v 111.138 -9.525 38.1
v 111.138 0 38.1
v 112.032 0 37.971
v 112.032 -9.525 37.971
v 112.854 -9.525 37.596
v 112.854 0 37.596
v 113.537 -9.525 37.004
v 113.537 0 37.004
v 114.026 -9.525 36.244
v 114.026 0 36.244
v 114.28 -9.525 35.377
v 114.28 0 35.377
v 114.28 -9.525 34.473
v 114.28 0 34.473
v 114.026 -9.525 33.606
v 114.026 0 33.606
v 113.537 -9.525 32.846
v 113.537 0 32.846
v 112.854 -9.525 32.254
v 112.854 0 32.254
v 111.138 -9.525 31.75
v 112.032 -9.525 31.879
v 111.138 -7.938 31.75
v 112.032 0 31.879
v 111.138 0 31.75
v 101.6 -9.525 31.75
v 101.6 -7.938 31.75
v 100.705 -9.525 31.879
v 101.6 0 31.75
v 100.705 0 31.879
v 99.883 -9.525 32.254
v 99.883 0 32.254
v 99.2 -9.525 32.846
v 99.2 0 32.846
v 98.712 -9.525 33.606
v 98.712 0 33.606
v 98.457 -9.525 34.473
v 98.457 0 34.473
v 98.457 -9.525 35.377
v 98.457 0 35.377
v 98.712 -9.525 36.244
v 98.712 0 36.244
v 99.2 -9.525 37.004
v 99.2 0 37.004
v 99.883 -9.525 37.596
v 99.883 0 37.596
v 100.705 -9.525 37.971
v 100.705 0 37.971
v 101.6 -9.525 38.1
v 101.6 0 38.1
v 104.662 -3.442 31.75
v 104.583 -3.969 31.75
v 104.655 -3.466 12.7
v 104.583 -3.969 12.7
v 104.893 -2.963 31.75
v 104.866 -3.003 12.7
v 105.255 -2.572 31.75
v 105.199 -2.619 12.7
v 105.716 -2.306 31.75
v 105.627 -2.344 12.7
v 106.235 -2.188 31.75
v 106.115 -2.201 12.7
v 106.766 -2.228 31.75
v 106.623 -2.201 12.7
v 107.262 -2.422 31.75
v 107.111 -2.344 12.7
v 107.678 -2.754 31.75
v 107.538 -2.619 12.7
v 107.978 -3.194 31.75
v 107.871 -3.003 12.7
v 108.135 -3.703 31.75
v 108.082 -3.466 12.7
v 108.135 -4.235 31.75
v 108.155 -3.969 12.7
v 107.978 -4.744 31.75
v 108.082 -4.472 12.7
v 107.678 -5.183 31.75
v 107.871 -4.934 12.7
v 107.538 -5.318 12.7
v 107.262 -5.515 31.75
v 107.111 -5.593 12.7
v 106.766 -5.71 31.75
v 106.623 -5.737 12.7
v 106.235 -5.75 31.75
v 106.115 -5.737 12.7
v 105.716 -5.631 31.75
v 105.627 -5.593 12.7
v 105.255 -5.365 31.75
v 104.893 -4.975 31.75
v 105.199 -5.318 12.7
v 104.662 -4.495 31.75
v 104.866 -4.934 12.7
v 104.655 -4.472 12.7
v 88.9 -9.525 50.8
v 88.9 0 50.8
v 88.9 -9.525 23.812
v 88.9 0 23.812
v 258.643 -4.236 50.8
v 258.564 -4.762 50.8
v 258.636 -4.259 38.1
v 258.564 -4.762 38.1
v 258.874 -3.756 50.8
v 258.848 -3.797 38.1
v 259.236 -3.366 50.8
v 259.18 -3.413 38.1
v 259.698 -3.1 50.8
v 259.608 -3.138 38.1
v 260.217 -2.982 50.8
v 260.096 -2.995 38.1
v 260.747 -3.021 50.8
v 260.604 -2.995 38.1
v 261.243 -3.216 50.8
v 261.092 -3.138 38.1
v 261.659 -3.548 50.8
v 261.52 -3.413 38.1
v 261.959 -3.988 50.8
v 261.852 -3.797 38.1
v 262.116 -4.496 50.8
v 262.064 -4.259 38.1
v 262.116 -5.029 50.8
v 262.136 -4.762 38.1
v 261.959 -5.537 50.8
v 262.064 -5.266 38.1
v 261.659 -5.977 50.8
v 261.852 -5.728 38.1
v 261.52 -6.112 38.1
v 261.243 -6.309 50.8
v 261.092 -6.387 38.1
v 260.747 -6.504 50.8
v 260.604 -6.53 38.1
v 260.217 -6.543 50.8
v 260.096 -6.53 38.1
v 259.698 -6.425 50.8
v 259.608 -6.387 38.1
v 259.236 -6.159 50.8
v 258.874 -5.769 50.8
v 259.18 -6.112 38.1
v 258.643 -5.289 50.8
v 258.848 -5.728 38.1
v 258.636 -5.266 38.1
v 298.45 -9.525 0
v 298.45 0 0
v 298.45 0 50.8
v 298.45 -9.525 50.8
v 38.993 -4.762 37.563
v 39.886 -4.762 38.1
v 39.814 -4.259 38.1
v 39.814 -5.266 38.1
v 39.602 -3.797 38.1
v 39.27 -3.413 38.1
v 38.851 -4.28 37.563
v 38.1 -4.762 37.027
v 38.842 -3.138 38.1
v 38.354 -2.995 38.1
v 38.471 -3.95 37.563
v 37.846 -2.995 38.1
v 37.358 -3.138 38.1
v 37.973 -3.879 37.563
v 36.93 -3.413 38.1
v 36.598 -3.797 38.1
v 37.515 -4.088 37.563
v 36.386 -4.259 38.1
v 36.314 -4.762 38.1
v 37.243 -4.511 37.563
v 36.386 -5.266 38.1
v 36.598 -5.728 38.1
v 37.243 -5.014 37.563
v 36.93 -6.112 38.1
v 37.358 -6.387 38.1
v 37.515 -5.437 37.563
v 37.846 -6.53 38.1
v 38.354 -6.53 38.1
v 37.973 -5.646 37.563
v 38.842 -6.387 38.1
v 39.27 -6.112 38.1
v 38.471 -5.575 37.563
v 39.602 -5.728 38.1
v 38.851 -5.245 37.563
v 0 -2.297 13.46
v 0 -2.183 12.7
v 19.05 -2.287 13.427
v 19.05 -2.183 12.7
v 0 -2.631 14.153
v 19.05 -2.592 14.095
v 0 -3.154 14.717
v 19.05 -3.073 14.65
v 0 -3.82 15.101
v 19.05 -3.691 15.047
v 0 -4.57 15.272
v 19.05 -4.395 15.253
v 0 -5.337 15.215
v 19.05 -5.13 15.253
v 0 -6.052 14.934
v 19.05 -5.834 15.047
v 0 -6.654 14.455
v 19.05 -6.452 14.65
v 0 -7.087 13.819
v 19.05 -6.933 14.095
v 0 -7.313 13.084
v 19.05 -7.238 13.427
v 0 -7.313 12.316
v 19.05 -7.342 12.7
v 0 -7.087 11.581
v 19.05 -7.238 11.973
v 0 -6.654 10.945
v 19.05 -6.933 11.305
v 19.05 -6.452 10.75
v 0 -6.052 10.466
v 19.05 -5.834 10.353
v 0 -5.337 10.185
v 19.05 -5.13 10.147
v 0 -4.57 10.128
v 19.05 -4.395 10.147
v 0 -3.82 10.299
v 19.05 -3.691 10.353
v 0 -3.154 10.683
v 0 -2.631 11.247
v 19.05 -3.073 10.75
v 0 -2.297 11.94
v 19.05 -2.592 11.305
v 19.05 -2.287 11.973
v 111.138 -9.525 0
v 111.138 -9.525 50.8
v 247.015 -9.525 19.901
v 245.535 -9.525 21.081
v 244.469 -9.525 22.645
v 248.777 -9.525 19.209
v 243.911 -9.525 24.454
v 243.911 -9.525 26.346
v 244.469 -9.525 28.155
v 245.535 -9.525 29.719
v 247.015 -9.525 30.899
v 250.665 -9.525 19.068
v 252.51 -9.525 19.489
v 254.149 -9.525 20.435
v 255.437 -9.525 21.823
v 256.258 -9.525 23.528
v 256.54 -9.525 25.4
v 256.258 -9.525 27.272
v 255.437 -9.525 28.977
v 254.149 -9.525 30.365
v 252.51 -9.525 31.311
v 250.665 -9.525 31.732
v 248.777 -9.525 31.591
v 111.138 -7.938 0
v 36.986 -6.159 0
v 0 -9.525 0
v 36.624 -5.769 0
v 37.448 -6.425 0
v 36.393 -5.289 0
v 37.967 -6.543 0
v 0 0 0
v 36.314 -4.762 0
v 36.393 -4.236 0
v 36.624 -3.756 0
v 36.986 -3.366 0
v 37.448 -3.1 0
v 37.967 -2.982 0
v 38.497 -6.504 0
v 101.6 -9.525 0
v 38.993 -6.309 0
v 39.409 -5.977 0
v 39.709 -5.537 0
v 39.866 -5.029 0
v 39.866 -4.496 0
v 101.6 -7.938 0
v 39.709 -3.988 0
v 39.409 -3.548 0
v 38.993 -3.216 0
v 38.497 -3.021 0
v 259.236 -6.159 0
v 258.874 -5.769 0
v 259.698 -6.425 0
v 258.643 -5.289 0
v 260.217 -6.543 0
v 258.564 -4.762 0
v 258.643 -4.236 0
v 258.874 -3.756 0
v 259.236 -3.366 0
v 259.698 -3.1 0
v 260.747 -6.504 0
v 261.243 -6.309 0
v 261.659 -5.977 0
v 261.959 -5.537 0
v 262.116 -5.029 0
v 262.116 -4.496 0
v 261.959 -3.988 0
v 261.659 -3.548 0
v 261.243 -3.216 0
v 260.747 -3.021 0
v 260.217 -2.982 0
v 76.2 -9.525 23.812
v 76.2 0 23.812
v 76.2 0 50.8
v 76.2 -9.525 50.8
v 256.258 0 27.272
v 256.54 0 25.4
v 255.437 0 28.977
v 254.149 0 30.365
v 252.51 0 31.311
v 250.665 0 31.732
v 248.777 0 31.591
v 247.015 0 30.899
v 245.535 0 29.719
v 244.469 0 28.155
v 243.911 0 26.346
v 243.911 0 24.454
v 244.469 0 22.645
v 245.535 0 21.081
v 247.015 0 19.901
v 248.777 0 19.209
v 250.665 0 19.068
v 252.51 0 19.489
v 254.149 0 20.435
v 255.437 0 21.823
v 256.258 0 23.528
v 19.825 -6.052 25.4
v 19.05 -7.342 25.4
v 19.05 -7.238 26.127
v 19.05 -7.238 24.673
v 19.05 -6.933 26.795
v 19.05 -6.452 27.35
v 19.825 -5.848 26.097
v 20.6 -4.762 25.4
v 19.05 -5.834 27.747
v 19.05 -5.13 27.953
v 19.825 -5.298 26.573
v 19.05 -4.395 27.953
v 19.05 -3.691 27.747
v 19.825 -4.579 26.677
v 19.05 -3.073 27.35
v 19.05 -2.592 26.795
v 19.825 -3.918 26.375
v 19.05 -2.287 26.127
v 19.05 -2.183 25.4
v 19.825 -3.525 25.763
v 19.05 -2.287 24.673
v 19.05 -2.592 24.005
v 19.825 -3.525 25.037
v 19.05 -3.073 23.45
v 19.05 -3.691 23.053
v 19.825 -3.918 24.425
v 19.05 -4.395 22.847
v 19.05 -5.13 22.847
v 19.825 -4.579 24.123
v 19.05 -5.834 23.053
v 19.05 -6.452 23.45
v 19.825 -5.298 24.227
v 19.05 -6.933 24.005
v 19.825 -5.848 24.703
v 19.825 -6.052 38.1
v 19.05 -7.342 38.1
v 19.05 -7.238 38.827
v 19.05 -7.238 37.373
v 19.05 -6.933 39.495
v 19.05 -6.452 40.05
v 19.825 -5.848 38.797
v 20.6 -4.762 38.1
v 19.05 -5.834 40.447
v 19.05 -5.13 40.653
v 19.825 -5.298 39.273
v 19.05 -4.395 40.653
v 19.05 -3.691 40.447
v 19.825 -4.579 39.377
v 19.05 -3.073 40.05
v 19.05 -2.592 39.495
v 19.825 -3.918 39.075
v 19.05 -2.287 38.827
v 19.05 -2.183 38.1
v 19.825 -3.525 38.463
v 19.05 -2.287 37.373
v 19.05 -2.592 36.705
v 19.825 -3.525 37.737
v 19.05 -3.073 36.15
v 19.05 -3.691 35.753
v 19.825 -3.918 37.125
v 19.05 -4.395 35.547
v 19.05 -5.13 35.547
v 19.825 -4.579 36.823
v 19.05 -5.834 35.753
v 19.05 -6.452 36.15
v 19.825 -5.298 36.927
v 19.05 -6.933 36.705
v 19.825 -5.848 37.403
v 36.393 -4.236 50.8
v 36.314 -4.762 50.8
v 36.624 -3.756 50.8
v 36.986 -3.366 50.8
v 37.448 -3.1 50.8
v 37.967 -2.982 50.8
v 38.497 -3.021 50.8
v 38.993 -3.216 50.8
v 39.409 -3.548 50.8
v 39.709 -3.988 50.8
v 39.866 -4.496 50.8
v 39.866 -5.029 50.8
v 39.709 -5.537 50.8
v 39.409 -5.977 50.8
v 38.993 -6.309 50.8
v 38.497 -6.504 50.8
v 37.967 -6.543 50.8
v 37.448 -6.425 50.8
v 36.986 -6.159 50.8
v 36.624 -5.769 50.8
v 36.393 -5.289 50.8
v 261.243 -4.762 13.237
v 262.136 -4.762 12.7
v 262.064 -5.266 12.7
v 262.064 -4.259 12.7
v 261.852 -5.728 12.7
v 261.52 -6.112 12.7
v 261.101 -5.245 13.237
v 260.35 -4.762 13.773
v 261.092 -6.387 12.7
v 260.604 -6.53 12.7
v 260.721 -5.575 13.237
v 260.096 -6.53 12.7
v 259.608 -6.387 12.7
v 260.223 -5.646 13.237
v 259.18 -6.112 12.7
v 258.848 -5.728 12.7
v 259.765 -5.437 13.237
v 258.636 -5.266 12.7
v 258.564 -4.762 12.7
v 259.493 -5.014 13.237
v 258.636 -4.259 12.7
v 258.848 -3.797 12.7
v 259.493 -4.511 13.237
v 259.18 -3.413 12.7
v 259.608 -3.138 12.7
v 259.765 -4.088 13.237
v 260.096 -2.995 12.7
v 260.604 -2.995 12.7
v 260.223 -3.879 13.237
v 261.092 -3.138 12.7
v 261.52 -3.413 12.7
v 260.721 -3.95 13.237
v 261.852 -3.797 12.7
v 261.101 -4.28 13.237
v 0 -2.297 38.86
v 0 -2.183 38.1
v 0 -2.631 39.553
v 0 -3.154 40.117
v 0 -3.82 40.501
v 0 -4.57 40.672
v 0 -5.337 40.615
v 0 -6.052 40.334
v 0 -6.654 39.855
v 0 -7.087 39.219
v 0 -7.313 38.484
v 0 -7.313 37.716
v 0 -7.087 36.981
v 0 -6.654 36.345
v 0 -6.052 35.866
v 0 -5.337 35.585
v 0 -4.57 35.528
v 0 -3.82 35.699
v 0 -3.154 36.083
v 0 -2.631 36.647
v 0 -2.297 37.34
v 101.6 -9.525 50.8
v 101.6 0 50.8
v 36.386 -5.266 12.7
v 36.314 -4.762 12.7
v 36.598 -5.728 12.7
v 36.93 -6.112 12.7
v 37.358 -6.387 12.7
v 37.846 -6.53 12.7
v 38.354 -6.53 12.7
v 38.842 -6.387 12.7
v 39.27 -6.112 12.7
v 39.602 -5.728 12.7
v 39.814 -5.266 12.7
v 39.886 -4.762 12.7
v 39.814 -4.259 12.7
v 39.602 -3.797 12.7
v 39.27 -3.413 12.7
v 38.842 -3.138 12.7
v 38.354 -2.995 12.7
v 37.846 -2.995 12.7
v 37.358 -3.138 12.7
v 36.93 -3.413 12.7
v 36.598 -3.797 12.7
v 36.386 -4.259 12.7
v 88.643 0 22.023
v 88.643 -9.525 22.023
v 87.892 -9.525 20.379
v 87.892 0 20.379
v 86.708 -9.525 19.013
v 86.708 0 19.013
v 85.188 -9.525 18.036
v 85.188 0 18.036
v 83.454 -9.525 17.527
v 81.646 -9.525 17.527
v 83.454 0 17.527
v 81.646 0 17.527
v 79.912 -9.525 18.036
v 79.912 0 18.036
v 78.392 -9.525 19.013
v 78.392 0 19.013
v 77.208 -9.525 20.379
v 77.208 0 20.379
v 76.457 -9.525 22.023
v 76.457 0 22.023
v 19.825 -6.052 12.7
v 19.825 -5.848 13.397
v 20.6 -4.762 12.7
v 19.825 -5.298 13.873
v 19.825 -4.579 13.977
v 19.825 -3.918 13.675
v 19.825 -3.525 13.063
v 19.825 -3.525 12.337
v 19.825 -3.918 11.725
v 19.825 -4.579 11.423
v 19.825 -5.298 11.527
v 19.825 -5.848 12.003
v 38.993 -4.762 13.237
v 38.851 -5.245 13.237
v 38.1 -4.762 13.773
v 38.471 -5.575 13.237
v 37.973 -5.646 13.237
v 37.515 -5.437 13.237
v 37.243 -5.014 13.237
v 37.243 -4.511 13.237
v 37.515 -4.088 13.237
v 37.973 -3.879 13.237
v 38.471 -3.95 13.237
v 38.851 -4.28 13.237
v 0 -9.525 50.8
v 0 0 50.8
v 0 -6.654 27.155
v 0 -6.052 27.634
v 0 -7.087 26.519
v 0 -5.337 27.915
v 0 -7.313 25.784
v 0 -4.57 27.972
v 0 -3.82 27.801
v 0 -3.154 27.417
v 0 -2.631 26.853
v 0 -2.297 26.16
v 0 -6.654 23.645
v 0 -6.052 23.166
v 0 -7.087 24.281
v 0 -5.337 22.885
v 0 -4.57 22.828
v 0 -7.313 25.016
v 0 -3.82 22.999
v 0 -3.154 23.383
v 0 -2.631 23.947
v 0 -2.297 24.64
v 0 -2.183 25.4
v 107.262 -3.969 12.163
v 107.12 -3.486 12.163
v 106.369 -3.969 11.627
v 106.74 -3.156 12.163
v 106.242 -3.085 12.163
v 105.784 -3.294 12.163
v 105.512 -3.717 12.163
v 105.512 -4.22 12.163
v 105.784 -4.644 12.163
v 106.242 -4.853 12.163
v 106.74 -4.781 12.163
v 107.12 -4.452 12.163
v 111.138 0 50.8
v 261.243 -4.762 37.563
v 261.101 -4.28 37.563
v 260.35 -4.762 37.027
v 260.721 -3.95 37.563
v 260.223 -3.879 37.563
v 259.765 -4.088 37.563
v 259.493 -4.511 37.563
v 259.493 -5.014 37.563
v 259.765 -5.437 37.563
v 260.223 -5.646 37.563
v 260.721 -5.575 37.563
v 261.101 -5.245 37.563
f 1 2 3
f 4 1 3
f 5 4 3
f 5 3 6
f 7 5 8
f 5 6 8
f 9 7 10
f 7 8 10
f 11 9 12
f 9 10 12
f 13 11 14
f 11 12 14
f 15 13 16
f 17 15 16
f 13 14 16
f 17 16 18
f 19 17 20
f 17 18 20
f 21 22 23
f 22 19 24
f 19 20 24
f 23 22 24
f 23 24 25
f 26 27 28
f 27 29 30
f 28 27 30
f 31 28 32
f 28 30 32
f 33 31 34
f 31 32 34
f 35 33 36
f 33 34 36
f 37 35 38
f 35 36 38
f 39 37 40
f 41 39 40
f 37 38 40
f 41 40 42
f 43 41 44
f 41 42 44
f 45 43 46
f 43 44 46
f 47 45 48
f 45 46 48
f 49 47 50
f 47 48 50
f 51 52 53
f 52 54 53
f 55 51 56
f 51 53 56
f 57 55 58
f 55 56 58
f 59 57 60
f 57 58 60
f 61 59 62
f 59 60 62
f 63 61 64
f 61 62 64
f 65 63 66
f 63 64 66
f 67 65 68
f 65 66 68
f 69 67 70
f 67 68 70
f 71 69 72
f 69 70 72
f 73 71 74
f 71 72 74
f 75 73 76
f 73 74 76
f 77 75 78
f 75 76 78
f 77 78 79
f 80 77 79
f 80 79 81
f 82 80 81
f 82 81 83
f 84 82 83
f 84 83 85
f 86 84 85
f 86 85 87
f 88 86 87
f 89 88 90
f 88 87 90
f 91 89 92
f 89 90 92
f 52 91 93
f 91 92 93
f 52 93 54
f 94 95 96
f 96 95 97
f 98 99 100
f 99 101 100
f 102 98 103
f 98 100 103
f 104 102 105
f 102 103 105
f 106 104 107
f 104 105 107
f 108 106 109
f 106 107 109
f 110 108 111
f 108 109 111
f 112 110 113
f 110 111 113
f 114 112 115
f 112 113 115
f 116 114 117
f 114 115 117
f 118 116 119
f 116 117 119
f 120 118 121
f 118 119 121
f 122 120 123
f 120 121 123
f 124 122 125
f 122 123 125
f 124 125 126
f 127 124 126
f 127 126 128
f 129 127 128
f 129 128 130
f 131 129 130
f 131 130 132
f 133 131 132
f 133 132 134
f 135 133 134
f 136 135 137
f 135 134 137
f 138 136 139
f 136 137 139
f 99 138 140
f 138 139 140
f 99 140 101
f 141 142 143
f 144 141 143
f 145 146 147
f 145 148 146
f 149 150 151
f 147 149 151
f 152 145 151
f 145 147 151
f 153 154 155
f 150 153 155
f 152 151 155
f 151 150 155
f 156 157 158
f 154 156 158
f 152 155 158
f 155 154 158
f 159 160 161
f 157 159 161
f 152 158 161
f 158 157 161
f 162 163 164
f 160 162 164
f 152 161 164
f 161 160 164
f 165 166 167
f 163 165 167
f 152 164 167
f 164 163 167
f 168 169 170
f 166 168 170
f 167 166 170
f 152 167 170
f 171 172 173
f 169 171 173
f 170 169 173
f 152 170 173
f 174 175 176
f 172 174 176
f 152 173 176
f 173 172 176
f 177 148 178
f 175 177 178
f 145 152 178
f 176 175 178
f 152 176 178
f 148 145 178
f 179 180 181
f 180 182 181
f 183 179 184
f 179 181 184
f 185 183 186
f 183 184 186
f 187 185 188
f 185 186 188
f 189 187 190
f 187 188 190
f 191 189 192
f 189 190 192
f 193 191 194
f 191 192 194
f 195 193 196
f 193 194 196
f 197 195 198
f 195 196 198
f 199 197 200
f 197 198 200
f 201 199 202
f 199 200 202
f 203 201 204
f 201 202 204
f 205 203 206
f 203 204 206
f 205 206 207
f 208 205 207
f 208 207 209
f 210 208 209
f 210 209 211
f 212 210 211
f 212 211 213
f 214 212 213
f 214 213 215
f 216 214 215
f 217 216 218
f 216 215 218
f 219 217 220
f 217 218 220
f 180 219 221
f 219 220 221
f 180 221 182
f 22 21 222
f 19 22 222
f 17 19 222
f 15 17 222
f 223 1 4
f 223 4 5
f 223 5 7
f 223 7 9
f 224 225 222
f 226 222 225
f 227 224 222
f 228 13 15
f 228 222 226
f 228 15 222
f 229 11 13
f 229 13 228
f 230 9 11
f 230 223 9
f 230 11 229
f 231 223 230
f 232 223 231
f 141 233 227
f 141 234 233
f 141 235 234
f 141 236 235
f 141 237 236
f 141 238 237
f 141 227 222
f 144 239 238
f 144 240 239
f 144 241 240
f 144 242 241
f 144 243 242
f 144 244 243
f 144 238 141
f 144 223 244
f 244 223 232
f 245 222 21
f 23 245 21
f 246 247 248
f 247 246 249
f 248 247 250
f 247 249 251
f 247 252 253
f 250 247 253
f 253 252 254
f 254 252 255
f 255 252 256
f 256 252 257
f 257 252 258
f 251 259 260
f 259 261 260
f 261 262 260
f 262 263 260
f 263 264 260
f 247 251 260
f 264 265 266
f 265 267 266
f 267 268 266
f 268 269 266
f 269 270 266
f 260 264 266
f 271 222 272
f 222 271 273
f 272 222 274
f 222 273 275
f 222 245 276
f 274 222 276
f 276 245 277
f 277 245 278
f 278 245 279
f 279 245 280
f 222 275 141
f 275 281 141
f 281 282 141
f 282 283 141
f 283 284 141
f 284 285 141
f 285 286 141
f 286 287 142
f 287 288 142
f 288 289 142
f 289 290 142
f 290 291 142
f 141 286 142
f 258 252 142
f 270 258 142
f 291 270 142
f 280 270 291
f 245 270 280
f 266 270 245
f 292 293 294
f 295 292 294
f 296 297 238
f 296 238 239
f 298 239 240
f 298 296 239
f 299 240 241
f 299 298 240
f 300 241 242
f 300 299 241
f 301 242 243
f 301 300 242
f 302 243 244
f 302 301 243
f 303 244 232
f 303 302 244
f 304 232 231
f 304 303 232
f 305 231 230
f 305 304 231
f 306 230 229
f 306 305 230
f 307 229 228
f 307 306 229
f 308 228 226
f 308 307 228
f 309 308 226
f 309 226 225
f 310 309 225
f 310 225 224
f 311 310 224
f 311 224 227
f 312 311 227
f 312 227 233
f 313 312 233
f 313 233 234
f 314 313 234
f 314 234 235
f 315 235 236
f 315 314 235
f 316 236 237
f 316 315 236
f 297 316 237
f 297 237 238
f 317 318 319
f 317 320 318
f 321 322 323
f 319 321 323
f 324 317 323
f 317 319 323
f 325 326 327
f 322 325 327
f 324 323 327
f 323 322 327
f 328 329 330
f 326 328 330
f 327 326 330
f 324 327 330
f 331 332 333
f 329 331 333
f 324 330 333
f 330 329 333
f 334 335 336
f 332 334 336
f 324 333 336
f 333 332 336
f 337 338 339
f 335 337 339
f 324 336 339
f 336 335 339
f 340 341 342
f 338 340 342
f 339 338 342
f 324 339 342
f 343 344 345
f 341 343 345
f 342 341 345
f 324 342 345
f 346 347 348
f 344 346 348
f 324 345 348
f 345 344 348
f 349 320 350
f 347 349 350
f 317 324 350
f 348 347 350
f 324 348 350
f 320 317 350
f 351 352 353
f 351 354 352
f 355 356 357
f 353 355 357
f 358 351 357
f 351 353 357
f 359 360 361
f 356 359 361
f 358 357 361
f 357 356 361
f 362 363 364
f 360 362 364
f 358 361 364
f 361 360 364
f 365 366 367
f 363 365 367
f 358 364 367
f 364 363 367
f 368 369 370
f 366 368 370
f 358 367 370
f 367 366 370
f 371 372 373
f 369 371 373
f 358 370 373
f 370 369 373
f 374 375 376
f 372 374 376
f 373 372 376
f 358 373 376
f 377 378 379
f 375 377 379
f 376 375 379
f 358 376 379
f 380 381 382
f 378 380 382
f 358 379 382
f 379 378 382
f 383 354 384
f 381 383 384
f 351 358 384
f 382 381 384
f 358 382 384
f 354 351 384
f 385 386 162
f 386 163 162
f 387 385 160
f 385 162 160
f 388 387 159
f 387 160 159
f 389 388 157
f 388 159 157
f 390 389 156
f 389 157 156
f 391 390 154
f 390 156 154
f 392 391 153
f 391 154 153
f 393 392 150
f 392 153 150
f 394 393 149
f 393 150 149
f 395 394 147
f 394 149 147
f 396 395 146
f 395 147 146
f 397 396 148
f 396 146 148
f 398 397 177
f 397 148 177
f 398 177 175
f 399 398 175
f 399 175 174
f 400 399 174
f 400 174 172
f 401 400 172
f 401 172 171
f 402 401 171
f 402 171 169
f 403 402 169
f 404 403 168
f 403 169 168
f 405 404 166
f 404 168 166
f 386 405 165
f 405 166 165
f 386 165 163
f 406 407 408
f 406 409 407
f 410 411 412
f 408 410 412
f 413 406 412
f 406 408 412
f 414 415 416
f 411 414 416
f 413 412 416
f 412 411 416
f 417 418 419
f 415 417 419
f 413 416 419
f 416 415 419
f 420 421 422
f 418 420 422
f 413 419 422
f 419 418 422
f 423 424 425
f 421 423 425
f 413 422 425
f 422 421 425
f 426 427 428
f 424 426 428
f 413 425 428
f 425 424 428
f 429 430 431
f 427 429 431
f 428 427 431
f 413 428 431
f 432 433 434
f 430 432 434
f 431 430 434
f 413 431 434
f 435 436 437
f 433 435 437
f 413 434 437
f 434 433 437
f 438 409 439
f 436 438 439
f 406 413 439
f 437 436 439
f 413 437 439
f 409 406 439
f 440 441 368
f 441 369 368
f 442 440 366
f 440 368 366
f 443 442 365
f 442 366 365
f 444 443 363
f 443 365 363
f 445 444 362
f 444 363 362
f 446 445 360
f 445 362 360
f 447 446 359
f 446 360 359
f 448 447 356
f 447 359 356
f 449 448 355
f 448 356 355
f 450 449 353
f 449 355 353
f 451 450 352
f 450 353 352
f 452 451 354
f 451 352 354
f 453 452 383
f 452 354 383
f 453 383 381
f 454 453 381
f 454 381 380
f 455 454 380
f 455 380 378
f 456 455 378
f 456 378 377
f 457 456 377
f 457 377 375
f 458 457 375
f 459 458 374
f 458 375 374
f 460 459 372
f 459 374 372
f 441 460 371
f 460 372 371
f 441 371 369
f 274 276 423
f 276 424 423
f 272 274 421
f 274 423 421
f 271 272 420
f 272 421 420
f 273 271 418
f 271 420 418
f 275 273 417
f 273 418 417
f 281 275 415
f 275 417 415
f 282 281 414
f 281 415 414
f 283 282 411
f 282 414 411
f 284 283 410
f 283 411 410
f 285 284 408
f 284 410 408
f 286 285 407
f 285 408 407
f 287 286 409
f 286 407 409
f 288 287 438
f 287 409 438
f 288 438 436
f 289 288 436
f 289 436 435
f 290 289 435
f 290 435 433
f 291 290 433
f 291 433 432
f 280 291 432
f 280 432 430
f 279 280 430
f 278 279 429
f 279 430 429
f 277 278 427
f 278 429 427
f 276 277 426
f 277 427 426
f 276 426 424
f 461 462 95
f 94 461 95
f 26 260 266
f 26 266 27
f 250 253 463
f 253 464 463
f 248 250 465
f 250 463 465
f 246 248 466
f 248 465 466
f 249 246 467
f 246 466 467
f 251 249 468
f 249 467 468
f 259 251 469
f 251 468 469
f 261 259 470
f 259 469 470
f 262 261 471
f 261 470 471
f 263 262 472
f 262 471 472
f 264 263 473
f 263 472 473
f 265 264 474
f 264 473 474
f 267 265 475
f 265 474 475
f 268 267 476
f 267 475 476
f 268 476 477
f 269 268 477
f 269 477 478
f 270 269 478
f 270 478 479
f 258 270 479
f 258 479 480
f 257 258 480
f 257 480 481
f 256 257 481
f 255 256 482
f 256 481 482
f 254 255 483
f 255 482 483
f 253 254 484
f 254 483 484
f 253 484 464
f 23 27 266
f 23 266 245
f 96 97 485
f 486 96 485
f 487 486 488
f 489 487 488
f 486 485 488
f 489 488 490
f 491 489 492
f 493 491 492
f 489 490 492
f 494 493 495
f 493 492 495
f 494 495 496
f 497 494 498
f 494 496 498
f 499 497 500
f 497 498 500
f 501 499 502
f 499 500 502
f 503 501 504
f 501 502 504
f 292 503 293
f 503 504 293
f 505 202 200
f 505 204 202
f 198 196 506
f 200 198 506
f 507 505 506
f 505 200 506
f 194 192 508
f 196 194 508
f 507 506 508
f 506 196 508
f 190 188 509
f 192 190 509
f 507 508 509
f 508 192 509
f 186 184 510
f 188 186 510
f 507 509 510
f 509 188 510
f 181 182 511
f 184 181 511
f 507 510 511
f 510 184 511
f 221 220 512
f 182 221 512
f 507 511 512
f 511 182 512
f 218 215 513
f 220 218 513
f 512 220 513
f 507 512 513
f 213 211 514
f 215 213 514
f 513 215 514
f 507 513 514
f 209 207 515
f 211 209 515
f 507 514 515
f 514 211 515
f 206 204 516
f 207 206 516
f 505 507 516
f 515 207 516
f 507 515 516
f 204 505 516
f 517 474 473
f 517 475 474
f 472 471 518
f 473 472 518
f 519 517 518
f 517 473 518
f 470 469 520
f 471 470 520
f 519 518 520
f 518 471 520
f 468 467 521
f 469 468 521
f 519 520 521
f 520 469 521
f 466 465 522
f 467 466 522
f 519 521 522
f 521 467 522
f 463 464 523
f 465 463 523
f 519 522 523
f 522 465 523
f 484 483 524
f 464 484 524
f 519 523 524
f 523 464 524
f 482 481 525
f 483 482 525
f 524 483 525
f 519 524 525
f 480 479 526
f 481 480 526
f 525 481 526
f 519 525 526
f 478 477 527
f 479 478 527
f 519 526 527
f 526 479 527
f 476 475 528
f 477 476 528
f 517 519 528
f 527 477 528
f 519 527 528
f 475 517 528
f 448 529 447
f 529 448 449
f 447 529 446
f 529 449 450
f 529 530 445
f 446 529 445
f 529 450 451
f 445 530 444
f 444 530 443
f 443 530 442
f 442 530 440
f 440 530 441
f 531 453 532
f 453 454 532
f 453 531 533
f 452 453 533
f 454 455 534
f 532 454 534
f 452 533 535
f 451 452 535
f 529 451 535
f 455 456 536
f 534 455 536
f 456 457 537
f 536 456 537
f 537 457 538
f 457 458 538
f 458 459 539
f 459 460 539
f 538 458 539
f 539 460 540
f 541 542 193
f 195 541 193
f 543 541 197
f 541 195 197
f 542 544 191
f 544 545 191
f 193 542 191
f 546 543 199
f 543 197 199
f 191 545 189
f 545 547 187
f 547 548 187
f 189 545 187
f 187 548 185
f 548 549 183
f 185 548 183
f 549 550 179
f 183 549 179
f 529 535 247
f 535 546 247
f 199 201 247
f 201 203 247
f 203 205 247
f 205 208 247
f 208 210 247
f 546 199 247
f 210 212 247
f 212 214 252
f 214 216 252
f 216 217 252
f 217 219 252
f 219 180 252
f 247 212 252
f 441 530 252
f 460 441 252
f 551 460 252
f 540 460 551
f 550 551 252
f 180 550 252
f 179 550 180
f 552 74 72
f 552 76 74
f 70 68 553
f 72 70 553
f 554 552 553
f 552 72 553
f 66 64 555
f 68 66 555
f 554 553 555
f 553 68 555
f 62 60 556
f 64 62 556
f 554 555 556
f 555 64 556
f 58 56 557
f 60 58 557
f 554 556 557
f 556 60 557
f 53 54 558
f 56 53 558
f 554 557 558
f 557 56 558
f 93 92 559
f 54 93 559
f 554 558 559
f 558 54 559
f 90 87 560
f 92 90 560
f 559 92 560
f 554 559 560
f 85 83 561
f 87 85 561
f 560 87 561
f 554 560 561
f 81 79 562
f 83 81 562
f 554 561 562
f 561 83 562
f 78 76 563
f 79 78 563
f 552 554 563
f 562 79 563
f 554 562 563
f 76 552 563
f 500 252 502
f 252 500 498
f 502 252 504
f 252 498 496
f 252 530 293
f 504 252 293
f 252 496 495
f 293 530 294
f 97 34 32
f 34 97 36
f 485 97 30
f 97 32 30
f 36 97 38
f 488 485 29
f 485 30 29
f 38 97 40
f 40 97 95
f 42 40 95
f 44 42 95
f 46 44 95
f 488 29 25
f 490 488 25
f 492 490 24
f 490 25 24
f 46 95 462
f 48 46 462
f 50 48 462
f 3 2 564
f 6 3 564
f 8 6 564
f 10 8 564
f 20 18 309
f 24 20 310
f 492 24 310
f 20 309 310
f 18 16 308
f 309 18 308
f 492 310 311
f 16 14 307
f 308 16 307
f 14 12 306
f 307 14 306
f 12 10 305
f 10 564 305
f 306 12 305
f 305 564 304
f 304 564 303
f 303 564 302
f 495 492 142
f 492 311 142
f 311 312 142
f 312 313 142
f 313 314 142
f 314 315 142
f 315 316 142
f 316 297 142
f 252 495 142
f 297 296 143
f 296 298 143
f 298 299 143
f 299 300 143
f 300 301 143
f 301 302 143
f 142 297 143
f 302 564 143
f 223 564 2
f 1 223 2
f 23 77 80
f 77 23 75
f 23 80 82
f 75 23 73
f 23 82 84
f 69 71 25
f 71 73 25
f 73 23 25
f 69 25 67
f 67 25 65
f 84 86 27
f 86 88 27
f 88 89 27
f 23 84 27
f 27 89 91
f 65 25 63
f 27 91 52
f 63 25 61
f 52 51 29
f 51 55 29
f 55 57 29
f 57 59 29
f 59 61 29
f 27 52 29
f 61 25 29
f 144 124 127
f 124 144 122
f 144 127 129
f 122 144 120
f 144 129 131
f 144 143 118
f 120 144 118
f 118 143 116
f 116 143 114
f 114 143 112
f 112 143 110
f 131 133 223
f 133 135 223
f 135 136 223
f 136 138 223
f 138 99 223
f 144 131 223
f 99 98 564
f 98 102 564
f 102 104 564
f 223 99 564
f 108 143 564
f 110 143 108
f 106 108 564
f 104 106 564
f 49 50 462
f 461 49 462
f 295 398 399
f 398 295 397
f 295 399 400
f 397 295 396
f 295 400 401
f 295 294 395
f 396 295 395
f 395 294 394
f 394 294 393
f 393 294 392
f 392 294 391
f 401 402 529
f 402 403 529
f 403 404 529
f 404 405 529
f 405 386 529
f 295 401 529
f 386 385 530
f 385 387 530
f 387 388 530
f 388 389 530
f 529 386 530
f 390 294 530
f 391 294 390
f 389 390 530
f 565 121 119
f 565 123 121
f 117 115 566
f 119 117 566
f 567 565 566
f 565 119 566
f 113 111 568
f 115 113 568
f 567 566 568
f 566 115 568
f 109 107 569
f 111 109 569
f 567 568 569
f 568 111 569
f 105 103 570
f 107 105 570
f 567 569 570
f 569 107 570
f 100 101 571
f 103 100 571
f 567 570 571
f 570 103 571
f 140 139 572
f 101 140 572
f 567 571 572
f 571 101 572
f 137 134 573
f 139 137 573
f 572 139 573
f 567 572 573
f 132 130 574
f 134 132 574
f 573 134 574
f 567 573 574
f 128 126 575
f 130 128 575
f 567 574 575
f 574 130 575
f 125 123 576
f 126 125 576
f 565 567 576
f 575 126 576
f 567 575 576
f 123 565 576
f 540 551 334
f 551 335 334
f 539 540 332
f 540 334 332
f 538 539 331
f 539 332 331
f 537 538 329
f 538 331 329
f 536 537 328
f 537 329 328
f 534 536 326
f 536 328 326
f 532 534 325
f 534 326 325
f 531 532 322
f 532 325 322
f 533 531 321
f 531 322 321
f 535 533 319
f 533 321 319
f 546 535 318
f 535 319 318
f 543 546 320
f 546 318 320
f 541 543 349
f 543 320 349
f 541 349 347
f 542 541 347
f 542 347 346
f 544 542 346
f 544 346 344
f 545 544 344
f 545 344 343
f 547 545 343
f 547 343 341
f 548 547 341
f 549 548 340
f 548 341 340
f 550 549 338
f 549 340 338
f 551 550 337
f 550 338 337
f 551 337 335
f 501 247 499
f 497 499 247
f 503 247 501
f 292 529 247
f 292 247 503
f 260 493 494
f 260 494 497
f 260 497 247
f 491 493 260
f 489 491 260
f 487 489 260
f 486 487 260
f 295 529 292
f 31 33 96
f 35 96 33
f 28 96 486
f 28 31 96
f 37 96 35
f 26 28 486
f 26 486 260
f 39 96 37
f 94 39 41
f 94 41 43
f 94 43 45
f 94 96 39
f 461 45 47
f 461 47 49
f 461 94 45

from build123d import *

# Parameters (mm, degrees)
F0_R            = 6.35
F1_DEPTH        = 9.525
F2_W            = 9.5377
F2_H            = 31.75
F3_DEPTH        = 1.5875
F5_D            = 5.159375
F5_DEPTH        = 19.05
F5_TIP          = 1.5500326281
F7_D            = 3.571875
F7_DEPTH        = 19.05
F7_TIP          = 1.0730995118
F10_D           = 3.571875
F10_DEPTH       = 12.7
F10_TIP         = 1.0730995118
F10_ON_F9_D     = 3.571875
F10_ON_F9_DEPTH = 12.7
F10_ON_F9_TIP   = 1.0730995118


with BuildPart() as f1:
    # F0 (on Front) → F1 (new body)
    with BuildSketch(Plane.XZ):
        with BuildLine():
            Line((0, 50.8), (0, 0))
            Line((0, 0), (298.45, 0))
            Line((298.45, 0), (298.45, 50.8))
            Line((298.45, 50.8), (111.1377, 50.8))
            Line((111.1377, 50.8), (111.1377, 38.1))
            ThreePointArc((111.1377, 38.1), (114.3127, 34.925), (111.1377, 31.75))
            Line((111.1377, 31.75), (101.6, 31.75))
            ThreePointArc((101.6, 31.75), (98.425, 34.925), (101.6, 38.1))
            Line((101.6, 38.1), (101.6, 50.8))
            Line((101.6, 50.8), (88.9, 50.8))
            Line((88.9, 50.8), (88.9, 23.8125))
            ThreePointArc((88.9, 23.8125), (82.55, 17.4625), (76.2, 23.8125))
            Line((76.2, 23.8125), (76.2, 50.8))
            Line((76.2, 50.8), (0, 50.8))
        make_face()
        with Locations((250.19, 25.4)):
            Circle(F0_R, mode=Mode.SUBTRACT)
    extrude(amount=F1_DEPTH)

    # F2 (on face) → F3 (cut)
    with BuildSketch(Plane.XZ.offset(9.525)):
        with Locations((106.36885, 15.875)):
            Rectangle(F2_W, F2_H)
    extrude(amount=-F3_DEPTH, mode=Mode.SUBTRACT)

    # F5
    with Locations(Plane(origin=(0, 0, 0), x_dir=(0, -1, 0), z_dir=(-1, 0, 0))):
        with Locations((4.7625, 38.1), (4.7625, 25.4), (4.7625, 12.7)):
            Hole(F5_D / 2, depth=F5_DEPTH)
            with Locations((0, 0, -(F5_DEPTH + F5_TIP / 2))):  # 118° drill point
                Cone(0, F5_D / 2, F5_TIP, mode=Mode.SUBTRACT)

    # F7
    with Locations(Plane.XY.offset(31.75)):
        with Locations((106.36885, -3.96875)):
            Hole(F7_D / 2, depth=F7_DEPTH)
            with Locations((0, 0, -(F7_DEPTH + F7_TIP / 2))):  # 118° drill point
                Cone(0, F7_D / 2, F7_TIP, mode=Mode.SUBTRACT)

    # F10
    with Locations(Plane.XY.offset(50.8)):
        with Locations((38.1, -4.7625), (260.35, -4.7625)):
            Hole(F10_D / 2, depth=F10_DEPTH)
            with Locations((0, 0, -(F10_DEPTH + F10_TIP / 2))):  # 118° drill point
                Cone(0, F10_D / 2, F10_TIP, mode=Mode.SUBTRACT)

    # F10 on F9
    with Locations(Plane(origin=(0, 0, 0), x_dir=(1, 0, 0), z_dir=(0, 0, -1))):
        with Locations((260.35, 4.7625), (38.1, 4.7625)):
            Hole(F10_ON_F9_D / 2, depth=F10_ON_F9_DEPTH)
            with Locations((0, 0, -(F10_ON_F9_DEPTH + F10_ON_F9_TIP / 2))):  # 118° drill point
                Cone(0, F10_ON_F9_D / 2, F10_ON_F9_TIP, mode=Mode.SUBTRACT)


solid = f1.part
